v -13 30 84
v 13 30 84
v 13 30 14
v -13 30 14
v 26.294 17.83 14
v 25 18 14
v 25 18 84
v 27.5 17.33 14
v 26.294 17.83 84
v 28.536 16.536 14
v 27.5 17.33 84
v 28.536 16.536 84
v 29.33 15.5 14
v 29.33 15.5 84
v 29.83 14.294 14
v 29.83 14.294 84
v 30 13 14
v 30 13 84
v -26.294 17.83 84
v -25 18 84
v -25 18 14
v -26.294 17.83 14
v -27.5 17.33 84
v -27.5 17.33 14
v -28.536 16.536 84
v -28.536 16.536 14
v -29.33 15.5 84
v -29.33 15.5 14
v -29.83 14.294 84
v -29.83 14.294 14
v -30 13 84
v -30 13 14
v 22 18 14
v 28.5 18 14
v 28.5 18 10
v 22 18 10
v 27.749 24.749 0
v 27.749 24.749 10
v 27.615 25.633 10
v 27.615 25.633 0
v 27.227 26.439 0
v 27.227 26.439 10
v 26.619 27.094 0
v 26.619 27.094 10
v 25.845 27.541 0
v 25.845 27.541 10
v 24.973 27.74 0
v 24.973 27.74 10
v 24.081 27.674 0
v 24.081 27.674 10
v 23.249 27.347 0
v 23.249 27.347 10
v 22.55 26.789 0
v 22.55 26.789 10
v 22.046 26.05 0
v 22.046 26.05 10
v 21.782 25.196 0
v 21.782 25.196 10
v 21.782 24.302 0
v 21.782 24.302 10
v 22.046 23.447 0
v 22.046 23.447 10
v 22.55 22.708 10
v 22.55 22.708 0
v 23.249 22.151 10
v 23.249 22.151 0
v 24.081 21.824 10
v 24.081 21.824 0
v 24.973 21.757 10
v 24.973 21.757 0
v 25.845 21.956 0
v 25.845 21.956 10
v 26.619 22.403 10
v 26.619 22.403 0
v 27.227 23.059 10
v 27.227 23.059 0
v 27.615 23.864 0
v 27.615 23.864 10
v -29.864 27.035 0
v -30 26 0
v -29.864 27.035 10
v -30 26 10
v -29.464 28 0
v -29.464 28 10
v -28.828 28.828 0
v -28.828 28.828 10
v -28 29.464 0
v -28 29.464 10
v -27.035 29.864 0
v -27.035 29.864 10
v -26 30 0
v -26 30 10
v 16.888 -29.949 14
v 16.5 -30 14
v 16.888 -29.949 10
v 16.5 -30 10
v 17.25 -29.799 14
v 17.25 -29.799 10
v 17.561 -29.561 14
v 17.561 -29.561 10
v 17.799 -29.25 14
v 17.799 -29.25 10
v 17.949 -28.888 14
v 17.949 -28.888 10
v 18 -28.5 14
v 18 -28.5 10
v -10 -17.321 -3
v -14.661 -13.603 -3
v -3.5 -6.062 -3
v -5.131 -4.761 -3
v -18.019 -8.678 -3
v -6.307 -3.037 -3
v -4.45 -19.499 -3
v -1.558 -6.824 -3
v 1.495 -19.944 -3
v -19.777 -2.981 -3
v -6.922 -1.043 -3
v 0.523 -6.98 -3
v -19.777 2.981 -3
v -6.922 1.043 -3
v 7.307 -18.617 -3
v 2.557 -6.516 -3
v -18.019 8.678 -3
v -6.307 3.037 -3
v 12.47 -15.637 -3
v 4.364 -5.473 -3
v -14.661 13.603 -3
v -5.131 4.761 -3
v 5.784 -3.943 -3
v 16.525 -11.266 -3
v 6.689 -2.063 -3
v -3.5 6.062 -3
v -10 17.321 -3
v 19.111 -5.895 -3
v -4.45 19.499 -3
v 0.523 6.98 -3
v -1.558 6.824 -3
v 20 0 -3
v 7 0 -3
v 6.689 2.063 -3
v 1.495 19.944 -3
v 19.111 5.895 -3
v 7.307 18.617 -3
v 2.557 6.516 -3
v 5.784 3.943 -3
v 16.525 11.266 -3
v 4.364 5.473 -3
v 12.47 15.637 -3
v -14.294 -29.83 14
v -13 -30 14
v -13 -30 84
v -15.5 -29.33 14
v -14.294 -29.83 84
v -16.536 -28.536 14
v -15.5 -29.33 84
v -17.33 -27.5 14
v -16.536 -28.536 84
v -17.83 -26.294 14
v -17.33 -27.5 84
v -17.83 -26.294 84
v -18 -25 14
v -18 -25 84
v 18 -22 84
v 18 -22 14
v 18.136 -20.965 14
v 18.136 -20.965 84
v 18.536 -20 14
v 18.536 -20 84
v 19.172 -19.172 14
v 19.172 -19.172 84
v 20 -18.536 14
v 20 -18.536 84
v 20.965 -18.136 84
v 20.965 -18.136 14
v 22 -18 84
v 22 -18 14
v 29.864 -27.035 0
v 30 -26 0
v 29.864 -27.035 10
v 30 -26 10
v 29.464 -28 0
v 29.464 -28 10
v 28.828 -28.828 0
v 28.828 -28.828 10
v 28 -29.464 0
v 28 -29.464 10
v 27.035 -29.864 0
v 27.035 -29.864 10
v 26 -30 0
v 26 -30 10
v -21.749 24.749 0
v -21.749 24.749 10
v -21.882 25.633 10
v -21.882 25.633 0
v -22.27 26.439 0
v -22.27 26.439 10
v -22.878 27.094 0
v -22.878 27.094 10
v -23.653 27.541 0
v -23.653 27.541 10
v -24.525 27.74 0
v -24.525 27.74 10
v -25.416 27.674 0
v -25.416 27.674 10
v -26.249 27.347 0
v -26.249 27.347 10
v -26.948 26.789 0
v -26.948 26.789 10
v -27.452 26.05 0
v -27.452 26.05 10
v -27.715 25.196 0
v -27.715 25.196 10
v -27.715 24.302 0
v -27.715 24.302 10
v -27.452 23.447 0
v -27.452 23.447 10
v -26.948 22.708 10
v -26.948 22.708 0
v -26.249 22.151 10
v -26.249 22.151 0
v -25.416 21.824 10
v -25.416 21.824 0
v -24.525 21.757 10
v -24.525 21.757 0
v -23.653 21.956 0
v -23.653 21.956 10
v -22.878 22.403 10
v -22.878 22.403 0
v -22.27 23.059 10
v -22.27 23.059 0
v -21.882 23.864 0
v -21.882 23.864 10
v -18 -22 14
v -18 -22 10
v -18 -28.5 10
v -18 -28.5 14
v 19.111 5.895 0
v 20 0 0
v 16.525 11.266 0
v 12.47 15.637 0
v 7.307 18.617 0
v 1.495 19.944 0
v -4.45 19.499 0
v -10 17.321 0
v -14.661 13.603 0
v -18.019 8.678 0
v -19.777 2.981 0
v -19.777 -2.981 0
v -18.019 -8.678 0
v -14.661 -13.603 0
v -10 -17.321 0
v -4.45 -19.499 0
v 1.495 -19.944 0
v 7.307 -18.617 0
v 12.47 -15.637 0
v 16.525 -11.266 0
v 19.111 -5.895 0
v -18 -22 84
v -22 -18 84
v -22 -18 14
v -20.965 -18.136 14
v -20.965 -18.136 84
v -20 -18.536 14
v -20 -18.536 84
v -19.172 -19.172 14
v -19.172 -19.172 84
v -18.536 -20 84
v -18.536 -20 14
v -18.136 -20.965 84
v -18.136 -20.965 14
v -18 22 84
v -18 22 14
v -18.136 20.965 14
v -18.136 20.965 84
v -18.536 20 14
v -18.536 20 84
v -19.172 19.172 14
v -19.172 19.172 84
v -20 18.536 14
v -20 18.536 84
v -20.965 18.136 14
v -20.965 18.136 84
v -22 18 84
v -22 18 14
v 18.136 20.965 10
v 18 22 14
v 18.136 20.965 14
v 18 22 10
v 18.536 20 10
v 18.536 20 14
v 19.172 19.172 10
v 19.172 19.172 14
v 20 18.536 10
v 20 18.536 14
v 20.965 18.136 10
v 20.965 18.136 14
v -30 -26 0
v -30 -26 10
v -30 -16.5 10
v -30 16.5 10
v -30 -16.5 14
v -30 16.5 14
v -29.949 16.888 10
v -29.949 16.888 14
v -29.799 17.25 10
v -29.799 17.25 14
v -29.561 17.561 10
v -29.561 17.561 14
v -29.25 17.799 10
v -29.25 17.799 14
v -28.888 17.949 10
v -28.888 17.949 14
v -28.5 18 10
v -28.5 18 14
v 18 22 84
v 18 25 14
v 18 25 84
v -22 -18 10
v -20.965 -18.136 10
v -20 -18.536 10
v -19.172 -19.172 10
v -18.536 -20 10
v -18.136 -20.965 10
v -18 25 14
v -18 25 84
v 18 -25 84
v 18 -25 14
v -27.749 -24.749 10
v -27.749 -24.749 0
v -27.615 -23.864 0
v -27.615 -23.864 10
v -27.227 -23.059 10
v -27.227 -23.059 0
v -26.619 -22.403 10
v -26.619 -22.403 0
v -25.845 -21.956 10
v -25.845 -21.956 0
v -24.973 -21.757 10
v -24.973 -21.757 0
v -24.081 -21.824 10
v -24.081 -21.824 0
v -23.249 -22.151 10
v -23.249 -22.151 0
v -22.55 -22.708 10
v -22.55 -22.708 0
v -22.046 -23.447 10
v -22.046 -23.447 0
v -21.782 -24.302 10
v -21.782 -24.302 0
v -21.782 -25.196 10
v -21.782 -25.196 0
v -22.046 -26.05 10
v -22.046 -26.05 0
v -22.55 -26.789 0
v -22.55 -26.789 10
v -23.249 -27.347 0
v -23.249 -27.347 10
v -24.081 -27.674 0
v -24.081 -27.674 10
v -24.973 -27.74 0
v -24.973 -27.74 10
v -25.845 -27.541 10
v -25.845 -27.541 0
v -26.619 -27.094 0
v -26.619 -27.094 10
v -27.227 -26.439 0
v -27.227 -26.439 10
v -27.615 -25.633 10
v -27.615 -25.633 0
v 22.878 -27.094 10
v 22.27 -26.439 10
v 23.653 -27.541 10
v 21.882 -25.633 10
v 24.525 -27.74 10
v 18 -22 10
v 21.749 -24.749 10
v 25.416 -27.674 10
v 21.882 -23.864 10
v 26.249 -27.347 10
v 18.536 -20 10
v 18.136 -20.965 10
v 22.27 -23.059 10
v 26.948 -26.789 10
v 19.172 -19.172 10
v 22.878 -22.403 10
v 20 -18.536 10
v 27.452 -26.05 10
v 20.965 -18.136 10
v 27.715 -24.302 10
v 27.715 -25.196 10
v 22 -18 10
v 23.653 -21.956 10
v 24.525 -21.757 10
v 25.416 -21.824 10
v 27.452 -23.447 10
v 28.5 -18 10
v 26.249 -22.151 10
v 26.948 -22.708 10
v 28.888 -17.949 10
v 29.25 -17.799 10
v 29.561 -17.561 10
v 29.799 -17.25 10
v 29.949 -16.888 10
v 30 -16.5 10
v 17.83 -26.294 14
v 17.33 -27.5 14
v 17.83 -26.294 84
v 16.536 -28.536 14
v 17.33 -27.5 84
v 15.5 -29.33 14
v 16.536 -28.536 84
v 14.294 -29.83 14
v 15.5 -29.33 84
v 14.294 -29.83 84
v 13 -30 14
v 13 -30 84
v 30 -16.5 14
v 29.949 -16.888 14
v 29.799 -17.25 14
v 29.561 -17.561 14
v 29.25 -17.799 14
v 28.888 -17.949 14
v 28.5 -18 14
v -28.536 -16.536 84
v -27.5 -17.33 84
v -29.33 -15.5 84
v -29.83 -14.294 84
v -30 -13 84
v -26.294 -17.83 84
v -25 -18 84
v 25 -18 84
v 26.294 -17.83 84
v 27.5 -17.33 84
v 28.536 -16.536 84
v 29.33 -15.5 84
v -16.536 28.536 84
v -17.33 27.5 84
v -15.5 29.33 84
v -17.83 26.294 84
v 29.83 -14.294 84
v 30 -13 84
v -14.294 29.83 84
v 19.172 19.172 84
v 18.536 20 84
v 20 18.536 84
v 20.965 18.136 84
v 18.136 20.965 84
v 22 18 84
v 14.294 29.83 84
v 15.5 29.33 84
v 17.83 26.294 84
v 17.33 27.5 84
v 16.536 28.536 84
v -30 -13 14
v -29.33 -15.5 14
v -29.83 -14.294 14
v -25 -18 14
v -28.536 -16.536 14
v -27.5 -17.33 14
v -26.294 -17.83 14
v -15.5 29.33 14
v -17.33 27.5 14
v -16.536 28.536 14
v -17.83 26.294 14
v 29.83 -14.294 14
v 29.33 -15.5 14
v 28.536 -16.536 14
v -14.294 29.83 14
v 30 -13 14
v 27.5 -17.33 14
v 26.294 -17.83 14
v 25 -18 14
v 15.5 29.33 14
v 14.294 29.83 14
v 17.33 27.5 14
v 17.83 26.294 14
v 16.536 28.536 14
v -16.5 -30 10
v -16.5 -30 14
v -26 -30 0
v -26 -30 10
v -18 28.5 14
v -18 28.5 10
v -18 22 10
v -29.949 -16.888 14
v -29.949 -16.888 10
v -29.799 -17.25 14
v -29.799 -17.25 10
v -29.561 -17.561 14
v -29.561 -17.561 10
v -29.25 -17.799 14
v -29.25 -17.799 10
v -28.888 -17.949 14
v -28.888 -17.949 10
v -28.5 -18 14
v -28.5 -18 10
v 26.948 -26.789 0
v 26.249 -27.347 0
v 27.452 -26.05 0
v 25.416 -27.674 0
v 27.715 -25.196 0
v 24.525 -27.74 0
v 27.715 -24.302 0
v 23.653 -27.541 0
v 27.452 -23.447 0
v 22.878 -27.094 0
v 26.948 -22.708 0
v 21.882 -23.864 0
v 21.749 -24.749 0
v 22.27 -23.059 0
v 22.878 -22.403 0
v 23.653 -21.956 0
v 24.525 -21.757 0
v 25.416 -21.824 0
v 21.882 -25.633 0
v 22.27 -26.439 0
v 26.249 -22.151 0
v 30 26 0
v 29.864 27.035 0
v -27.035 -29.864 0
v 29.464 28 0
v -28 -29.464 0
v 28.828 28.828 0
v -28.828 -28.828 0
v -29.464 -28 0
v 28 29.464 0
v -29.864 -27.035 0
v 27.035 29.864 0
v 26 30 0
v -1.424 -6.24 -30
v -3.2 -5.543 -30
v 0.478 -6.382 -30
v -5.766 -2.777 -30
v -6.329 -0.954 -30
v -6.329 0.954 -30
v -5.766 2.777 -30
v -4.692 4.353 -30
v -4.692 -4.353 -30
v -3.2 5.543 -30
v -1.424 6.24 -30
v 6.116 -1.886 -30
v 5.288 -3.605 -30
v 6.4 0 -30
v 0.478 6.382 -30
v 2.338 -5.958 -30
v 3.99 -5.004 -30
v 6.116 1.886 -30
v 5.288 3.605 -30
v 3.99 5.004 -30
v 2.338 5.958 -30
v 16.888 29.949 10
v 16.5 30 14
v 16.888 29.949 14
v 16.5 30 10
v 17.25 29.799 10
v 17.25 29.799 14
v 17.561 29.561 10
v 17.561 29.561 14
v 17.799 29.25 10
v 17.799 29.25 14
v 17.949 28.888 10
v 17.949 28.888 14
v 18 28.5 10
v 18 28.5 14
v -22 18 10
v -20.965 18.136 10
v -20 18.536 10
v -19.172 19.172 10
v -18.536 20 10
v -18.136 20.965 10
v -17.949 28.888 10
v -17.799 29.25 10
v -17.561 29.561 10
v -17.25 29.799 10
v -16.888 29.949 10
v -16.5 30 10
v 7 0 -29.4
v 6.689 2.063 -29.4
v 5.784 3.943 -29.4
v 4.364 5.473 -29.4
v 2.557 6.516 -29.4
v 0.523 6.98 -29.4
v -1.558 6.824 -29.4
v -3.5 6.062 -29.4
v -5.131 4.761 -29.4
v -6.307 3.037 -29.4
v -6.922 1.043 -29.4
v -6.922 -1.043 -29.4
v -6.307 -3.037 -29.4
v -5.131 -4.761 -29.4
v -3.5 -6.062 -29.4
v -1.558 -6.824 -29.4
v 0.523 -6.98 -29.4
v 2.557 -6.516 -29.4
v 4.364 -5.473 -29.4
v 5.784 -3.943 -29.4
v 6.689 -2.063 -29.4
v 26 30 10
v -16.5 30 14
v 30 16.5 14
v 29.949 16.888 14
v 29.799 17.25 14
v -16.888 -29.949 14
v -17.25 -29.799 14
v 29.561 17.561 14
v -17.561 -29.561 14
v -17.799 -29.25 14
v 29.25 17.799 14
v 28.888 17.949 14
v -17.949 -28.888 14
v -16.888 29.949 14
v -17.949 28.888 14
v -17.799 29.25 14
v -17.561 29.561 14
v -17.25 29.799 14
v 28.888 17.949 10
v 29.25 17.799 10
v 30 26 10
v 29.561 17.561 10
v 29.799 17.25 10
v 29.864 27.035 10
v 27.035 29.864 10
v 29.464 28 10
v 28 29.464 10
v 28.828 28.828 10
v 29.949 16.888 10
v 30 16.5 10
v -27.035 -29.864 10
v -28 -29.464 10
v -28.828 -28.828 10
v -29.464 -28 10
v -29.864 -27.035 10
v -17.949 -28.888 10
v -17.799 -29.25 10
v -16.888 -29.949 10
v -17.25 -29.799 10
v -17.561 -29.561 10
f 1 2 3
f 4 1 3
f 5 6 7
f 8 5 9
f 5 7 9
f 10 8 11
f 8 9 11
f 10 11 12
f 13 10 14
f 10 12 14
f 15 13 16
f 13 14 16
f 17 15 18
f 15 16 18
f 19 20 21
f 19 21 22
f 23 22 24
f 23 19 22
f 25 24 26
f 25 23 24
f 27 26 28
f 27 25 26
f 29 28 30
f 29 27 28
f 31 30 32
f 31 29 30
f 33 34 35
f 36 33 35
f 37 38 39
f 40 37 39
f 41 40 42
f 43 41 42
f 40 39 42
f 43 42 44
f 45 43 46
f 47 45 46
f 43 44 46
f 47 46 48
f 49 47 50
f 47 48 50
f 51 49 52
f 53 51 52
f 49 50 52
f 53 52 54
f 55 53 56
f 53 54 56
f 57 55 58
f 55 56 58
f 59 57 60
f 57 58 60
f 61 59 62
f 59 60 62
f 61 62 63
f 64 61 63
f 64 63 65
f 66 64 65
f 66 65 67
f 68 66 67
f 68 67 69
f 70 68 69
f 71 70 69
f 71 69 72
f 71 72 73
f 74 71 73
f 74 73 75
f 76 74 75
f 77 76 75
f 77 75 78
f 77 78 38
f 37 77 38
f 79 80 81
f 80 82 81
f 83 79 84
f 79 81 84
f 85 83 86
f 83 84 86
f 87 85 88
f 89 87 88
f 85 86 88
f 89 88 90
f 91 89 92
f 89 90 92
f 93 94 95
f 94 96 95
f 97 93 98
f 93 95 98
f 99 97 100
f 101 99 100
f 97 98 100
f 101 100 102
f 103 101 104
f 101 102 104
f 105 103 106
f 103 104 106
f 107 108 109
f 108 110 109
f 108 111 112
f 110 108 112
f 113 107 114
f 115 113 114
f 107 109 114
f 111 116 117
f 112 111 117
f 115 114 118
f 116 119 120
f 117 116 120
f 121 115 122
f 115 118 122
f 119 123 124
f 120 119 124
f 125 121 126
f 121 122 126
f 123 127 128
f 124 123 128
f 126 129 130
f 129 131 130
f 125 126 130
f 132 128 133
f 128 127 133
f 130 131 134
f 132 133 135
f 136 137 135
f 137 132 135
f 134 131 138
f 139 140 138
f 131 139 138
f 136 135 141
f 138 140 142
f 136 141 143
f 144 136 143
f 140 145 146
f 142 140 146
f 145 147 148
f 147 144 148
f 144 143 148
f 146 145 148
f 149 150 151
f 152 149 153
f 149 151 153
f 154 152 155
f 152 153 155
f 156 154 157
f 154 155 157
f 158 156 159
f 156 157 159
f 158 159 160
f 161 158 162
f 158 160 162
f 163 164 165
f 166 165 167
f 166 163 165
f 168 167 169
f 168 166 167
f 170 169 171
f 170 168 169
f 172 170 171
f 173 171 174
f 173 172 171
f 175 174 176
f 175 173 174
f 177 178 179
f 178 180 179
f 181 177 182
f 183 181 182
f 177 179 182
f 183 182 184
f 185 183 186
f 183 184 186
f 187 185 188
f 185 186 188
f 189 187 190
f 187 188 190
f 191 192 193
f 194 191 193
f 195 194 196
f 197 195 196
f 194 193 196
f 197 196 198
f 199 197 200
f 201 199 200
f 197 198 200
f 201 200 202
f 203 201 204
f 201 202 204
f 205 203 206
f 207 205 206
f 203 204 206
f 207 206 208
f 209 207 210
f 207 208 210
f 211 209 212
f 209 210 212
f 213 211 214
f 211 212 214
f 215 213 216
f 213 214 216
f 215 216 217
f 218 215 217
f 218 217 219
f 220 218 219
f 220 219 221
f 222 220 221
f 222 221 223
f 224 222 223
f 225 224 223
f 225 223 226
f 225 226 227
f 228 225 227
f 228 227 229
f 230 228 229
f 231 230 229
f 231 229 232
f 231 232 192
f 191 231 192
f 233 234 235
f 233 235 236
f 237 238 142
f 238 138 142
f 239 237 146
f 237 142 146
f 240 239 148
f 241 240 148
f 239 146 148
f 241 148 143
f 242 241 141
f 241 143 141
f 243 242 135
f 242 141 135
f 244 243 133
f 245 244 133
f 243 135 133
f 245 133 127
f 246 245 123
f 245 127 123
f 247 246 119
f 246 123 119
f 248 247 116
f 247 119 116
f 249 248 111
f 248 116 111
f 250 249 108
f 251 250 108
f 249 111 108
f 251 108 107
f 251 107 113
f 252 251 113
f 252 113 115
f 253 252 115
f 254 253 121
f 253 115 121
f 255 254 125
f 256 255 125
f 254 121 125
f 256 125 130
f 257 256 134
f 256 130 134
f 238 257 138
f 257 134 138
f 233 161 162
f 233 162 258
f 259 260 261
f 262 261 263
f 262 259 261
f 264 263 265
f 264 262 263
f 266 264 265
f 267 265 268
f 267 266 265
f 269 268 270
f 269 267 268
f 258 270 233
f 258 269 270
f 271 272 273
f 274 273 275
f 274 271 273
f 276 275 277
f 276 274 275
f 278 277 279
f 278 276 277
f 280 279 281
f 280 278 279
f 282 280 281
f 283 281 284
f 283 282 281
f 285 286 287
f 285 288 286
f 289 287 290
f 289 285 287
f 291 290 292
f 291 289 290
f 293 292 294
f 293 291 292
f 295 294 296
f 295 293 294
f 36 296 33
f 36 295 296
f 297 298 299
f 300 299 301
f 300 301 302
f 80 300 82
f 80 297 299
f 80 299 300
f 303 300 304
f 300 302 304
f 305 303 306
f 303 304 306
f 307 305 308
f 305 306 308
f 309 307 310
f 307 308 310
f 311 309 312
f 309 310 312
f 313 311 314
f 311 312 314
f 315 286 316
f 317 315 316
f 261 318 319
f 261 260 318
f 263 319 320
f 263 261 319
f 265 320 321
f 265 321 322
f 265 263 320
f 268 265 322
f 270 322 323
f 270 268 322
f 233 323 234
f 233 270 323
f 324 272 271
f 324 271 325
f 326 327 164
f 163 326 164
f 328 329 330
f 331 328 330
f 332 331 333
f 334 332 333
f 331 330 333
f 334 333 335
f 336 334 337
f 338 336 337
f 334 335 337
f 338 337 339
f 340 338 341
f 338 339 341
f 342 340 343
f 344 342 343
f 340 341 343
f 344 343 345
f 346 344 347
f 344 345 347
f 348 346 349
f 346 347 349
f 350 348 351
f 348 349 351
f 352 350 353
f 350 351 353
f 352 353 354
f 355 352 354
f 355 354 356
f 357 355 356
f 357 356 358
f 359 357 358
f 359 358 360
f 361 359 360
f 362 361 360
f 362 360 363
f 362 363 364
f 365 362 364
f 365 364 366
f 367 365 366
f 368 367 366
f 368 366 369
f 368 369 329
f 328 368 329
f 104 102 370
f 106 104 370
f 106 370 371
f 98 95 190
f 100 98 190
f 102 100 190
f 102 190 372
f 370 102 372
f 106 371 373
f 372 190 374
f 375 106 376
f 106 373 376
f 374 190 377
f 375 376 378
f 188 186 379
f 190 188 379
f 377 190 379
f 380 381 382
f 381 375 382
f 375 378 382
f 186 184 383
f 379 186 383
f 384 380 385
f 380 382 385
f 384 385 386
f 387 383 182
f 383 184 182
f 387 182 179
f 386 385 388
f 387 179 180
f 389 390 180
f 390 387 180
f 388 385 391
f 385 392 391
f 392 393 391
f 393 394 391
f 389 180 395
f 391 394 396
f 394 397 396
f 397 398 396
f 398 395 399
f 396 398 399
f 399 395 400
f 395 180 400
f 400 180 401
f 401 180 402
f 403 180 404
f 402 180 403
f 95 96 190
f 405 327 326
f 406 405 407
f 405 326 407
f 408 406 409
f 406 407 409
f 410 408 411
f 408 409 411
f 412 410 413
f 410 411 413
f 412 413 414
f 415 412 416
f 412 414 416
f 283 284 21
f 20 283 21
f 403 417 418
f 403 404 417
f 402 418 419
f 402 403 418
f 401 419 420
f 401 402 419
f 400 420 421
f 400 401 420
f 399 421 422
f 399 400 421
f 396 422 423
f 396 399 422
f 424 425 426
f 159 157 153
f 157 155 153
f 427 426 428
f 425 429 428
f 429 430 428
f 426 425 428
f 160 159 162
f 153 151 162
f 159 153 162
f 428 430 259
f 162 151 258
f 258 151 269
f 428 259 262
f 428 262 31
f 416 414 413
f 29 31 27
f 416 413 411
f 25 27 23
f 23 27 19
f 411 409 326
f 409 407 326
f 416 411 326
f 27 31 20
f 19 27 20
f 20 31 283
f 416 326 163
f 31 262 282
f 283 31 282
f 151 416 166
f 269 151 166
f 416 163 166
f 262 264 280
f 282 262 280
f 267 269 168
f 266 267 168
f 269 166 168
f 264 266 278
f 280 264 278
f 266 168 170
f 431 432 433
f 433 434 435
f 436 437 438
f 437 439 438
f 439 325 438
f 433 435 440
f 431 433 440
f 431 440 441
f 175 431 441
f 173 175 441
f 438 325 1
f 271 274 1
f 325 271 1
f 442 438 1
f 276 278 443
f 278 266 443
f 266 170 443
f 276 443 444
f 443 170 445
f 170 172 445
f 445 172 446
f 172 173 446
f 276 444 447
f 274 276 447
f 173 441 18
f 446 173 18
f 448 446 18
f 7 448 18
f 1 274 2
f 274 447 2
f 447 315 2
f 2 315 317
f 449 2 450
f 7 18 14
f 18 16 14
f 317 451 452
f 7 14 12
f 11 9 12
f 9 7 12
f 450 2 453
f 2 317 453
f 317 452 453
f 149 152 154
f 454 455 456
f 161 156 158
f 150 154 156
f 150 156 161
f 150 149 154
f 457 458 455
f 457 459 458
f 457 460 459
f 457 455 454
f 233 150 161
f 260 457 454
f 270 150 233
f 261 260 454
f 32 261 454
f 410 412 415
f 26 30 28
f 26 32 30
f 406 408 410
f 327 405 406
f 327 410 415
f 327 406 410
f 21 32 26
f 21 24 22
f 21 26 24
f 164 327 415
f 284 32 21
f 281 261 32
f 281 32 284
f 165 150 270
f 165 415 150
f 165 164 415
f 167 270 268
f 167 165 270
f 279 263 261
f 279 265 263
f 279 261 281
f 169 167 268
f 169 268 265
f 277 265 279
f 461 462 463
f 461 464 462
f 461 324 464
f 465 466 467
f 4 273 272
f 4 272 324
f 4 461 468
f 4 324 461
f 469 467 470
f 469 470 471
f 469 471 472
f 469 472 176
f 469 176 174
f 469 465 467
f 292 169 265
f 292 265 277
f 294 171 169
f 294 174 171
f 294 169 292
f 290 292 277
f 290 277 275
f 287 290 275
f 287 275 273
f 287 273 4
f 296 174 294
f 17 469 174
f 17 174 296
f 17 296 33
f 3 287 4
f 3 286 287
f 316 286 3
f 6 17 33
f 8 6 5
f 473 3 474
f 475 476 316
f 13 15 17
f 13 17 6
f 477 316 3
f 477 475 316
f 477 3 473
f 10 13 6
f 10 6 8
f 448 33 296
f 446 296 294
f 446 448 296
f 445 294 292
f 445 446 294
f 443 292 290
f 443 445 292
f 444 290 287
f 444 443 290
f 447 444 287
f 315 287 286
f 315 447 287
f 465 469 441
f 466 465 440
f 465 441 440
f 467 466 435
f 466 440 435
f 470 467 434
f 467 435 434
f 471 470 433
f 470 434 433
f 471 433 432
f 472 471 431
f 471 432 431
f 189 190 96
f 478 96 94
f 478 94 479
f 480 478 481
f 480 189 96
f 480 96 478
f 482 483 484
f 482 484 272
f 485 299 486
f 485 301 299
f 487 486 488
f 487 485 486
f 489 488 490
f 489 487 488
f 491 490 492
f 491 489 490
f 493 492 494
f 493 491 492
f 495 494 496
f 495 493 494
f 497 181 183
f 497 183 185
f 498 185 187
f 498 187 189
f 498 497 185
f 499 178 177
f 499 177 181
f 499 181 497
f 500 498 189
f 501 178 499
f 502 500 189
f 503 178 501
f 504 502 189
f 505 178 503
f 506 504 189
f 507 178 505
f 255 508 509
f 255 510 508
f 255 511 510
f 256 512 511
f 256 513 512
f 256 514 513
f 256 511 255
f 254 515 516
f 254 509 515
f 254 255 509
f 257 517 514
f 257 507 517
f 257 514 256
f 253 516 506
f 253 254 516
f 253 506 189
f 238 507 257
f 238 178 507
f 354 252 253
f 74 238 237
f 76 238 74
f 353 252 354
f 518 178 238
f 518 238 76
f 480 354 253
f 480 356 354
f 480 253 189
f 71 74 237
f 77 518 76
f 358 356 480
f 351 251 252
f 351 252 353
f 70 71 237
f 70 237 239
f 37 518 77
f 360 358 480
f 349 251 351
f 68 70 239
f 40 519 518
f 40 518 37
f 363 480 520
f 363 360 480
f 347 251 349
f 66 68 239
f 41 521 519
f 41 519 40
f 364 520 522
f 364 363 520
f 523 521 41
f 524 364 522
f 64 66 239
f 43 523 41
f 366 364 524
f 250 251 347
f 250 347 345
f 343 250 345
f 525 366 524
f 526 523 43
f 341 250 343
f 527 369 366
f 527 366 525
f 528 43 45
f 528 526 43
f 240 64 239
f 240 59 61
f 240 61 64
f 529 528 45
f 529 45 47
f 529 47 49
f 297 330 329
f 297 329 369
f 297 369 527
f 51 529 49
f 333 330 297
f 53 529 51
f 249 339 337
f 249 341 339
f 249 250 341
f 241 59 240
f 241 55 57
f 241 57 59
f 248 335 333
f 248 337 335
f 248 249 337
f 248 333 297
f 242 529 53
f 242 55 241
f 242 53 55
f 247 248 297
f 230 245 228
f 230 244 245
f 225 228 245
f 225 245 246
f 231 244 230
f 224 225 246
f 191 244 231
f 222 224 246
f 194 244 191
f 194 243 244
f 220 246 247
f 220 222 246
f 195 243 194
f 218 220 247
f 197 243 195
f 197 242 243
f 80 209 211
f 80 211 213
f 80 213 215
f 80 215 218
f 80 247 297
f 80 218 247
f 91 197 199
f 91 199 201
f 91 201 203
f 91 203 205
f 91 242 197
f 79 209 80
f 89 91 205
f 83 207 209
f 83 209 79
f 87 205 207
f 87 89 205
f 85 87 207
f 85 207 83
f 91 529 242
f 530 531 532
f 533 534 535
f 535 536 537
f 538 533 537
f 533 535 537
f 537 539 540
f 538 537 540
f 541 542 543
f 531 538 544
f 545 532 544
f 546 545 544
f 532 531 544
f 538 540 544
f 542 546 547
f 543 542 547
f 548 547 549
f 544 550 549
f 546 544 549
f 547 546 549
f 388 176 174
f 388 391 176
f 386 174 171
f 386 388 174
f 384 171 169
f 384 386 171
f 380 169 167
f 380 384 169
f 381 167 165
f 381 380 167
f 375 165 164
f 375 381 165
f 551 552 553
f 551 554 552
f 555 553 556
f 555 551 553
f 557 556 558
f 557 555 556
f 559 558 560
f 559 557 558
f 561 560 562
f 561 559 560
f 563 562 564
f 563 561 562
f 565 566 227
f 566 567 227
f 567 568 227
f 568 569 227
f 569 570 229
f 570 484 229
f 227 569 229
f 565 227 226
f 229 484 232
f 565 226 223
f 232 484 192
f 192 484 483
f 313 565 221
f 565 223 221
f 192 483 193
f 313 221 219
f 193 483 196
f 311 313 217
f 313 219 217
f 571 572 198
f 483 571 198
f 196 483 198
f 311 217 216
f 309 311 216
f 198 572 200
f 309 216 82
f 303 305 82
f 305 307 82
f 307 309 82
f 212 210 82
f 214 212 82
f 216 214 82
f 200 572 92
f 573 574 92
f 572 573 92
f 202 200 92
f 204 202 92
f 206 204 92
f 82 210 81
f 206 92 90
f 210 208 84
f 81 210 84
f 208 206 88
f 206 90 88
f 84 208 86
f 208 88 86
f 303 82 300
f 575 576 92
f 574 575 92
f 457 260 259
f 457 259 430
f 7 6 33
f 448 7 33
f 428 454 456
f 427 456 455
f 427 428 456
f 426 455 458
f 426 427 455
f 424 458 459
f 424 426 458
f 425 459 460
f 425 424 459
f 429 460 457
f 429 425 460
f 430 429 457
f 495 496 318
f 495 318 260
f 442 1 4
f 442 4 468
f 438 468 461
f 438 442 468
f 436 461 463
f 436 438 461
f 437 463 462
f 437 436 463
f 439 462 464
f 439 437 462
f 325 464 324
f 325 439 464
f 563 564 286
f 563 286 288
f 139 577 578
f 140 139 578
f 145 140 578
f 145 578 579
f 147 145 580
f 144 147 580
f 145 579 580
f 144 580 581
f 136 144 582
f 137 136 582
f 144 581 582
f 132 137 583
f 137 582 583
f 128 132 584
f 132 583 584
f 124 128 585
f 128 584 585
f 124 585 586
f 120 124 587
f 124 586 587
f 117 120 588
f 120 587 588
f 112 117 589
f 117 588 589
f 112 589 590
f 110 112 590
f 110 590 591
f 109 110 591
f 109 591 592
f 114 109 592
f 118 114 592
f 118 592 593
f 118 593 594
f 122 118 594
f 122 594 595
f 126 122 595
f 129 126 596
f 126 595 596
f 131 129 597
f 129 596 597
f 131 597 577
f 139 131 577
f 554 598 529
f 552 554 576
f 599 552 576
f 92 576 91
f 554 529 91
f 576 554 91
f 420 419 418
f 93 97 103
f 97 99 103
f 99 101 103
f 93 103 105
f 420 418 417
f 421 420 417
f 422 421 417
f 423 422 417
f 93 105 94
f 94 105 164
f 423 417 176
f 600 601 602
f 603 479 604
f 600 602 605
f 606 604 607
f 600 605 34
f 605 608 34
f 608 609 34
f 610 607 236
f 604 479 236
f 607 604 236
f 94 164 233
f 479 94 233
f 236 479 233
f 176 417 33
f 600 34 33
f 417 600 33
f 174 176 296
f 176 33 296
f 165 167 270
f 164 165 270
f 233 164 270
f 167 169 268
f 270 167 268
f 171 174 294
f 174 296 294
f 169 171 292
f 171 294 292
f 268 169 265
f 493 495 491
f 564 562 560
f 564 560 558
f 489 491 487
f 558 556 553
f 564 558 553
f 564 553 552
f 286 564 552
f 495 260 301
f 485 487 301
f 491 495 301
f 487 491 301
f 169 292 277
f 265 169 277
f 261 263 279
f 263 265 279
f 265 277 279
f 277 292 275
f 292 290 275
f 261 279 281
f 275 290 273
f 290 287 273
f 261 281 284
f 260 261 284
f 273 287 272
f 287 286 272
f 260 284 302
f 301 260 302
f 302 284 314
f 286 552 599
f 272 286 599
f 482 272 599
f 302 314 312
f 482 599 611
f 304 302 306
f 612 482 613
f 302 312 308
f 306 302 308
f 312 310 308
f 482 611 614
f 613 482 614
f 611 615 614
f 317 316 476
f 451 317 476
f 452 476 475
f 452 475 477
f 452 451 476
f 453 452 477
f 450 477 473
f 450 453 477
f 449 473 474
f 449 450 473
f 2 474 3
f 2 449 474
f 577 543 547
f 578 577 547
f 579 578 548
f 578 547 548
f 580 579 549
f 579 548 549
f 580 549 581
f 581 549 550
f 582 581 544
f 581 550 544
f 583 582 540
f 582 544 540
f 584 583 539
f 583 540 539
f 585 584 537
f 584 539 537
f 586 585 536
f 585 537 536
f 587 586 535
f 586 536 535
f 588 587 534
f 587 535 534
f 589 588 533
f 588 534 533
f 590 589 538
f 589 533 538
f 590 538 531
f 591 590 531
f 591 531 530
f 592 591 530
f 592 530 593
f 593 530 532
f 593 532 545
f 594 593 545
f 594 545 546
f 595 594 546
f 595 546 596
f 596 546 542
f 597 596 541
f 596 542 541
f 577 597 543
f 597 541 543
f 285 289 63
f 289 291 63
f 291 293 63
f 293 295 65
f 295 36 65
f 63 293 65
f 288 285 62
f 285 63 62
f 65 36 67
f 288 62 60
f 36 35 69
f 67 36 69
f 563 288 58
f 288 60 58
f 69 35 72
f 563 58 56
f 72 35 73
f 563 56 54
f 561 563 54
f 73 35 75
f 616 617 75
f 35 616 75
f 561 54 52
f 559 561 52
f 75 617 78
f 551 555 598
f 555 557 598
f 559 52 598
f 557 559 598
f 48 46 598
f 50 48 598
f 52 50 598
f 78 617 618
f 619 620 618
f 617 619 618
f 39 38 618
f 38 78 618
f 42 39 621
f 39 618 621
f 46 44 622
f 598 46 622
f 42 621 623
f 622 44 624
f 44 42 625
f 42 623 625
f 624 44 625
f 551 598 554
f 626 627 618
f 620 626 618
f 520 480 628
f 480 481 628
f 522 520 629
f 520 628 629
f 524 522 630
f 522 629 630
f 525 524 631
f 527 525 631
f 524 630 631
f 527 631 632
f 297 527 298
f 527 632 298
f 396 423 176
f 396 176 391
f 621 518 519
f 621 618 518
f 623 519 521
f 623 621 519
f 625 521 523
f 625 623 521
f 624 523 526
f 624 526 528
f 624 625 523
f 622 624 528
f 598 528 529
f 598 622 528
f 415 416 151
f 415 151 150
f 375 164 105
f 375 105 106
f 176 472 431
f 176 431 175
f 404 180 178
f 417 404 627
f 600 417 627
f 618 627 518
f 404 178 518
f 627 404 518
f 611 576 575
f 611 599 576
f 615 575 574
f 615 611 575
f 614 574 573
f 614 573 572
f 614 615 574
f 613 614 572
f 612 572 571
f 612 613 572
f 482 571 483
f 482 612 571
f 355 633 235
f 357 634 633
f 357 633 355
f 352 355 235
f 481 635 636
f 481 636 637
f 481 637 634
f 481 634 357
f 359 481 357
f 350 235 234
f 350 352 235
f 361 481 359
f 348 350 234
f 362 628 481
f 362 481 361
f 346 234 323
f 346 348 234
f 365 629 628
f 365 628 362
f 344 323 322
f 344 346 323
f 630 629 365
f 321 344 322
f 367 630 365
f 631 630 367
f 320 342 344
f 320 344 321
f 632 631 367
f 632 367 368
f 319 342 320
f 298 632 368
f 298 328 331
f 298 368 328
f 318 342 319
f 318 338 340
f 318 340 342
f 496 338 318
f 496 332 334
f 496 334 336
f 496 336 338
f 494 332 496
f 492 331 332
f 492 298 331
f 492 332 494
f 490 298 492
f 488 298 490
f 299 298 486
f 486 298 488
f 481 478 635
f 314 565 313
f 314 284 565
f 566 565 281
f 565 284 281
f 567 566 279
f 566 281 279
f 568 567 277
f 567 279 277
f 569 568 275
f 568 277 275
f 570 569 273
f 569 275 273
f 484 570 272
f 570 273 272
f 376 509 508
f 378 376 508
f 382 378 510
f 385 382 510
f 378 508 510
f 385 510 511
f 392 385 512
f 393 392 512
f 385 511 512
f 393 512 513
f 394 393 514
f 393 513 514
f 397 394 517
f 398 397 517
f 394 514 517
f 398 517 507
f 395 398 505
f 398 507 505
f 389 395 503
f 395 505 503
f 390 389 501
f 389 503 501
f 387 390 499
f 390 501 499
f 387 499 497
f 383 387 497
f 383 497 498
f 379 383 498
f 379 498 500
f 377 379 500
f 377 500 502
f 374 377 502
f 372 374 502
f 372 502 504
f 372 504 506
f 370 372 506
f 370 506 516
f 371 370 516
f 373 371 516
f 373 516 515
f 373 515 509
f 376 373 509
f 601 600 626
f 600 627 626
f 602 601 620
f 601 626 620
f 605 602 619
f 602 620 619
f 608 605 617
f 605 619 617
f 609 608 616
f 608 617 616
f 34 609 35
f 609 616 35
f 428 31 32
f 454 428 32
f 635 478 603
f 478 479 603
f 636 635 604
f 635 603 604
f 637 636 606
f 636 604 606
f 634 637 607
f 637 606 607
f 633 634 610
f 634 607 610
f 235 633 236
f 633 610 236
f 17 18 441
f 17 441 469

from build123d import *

# Parameters (mm, degrees)
SKETCH_1_W                = 60
SKETCH_1_H                = 60
EXTRUDE_1_DEPTH           = 14
SKETCH_2_W                = 4
SKETCH_2_H                = 12
CUT_EXTRUDE_1_DEPTH       = 12
SKETCH_3_W                = 12
SKETCH_3_H                = 4
CUT_EXTRUDE_2_DEPTH       = 12
SKETCH_4_W                = 4
SKETCH_4_H                = 12
CUT_EXTRUDE_3_DEPTH       = 12
SKETCH_5_W                = 4
SKETCH_5_H                = 12
CUT_EXTRUDE_4_DEPTH       = 12
HOLE_WIZARD_6_0_6_1_D     = 6
HOLE_WIZARD_6_0_6_1_DEPTH = 40
HOLE_WIZARD_6_0_6_2_D     = 6
HOLE_WIZARD_6_0_6_2_DEPTH = 14
CHAMFER_1_SIZE            = 0.6
FILLET_1_R                = 1.5
FILLET_2_R                = 4
SKETCH_15_W               = 75
SKETCH_15_H               = 60
EXTRUDE_2_DEPTH           = 60
SKETCH_21_W               = 12
SKETCH_21_H               = 12
CUT_EXTRUDE_5_DEPTH       = 87.168439698
SKETCH_43_W               = 12
SKETCH_43_H               = 12
CUT_EXTRUDE_7_DEPTH       = 87.168439698
SKETCH_50_W               = 12
SKETCH_50_H               = 12
CUT_EXTRUDE_8_DEPTH       = 87.168439698
SKETCH_57_W               = 12
SKETCH_57_H               = 12
CUT_EXTRUDE_9_DEPTH       = 87.168439698
FILLET_5_R                = 4
FILLET_6_R                = 5
SKETCH_58_W               = 5
SKETCH_58_H               = 60
CUT_EXTRUDE_10_DEPTH      = 86


with BuildPart() as part:
    # 草图1 → 凸台-拉伸1 (new body)
    with BuildSketch(Plane(origin=(0, 0, 0), x_dir=(-1, 0, 0), z_dir=(0, 0, -1))):
        Rectangle(SKETCH_1_W, SKETCH_1_H)
    extrude(amount=-EXTRUDE_1_DEPTH)

    # 草图2 → 切除-拉伸1 (cut)
    with BuildSketch(Plane(origin=(30, 0, 0), x_dir=(0, 0, -1), z_dir=(1, 0, 0))):
        with Locations((-12, 24)):
            Rectangle(SKETCH_2_W, SKETCH_2_H)
    extrude(amount=-CUT_EXTRUDE_1_DEPTH, mode=Mode.SUBTRACT)

    # 草图3 → 切除-拉伸2 (cut)
    with BuildSketch(Plane(origin=(0, 30, 0), x_dir=(-1, 0, 0), z_dir=(0, 1, 0))):
        with Locations((24, 12)):
            Rectangle(SKETCH_3_W, SKETCH_3_H)
    extrude(amount=-CUT_EXTRUDE_2_DEPTH, mode=Mode.SUBTRACT)

    # 草图4 → 切除-拉伸3 (cut)
    with BuildSketch(Plane.ZY.offset(30)):
        with Locations((12, -24)):
            Rectangle(SKETCH_4_W, SKETCH_4_H)
    extrude(amount=-CUT_EXTRUDE_3_DEPTH, mode=Mode.SUBTRACT)

    # 草图5 → 切除-拉伸4 (cut)
    with BuildSketch(Plane(origin=(30, 0, 0), x_dir=(0, 0, -1), z_dir=(1, 0, 0))):
        with Locations((-12, -24)):
            Rectangle(SKETCH_5_W, SKETCH_5_H)
    extrude(amount=-CUT_EXTRUDE_4_DEPTH, mode=Mode.SUBTRACT)

    # 草图6 → 旋转1 (revolve)
    with BuildSketch(Plane(origin=(0, 0, 0), x_dir=(1, 0, 0), z_dir=(0, 1, 0))):
        Polygon((7, 30), (0, 30), (0, 0), (20, 0), (20, 3), (7, 3), align=None)
    revolve(axis=Axis((0, 0, -30), (0, 0, 1)))

    # Ø6.0 (6) 直径孔1
    with Locations(Plane.XY.offset(10)):
        with Locations((-24.748737342, -24.748737342), (24.748737342, -24.748737342)):
            Hole(HOLE_WIZARD_6_0_6_1_D / 2, depth=HOLE_WIZARD_6_0_6_1_DEPTH)

    # Ø6.0 (6) 直径孔2
    with Locations(Plane(origin=(0, 0, 0), x_dir=(-1, 0, 0), z_dir=(0, 0, -1))):
        with Locations((24.748737342, 24.748737342), (-24.748737342, 24.748737342)):
            Hole(HOLE_WIZARD_6_0_6_2_D / 2, depth=HOLE_WIZARD_6_0_6_2_DEPTH)

    # 倒角1
    chamfer_1_edges = [part.edges().sort_by_distance(p)[0] for p in [
        (-7, 0, -30),
    ]]
    chamfer(chamfer_1_edges, length=CHAMFER_1_SIZE)

    # 圆角1
    fillet_1_edges = [part.edges().sort_by_distance(p)[0] for p in [
        (18, 30, 12),
        (30, 18, 12),
        (-30, 18, 12),
        (-18, 30, 12),
        (-18, -30, 12),
        (-30, -18, 12),
        (18, -30, 12),
        (30, -18, 12),
    ]]
    fillet(fillet_1_edges, radius=FILLET_1_R)

    # 圆角2
    fillet_2_edges = [part.edges().sort_by_distance(p)[0] for p in [
        (30, 30, 5),
        (18, 18, 12),
        (-30, 30, 5),
        (-18, 18, 12),
        (-30, -30, 5),
        (-18, -18, 12),
        (30, -30, 5),
        (18, -18, 12),
    ]]
    fillet(fillet_2_edges, radius=FILLET_2_R)


with BuildPart() as body_2:
    # 草图15 → 凸台-拉伸2 (new body)
    with BuildSketch(Plane(origin=(30, 0, 0), x_dir=(0, 0, -1), z_dir=(1, 0, 0))):
        with Locations((-51.5, 0)):
            Rectangle(SKETCH_15_W, SKETCH_15_H)
    extrude(amount=-EXTRUDE_2_DEPTH)

    # 草图21 → 切除-拉伸5 (cut, through all)
    with BuildSketch(Plane(origin=(0, 0, 14), x_dir=(-1, 0, 0), z_dir=(0, 0, -1))):
        with Locations((24, -24)):
            Rectangle(SKETCH_21_W, SKETCH_21_H)
    extrude(amount=-CUT_EXTRUDE_5_DEPTH, mode=Mode.SUBTRACT)

    # 草图43 → 切除-拉伸7 (cut, through all)
    with BuildSketch(Plane(origin=(0, 0, 14), x_dir=(-1, 0, 0), z_dir=(0, 0, -1))):
        with Locations((-24, -24)):
            Rectangle(SKETCH_43_W, SKETCH_43_H)
    extrude(amount=-CUT_EXTRUDE_7_DEPTH, mode=Mode.SUBTRACT)

    # 草图50 → 切除-拉伸8 (cut, through all)
    with BuildSketch(Plane(origin=(0, 0, 14), x_dir=(-1, 0, 0), z_dir=(0, 0, -1))):
        with Locations((-24, 24)):
            Rectangle(SKETCH_50_W, SKETCH_50_H)
    extrude(amount=-CUT_EXTRUDE_8_DEPTH, mode=Mode.SUBTRACT)

    # 草图57 → 切除-拉伸9 (cut, through all)
    with BuildSketch(Plane(origin=(0, 0, 14), x_dir=(-1, 0, 0), z_dir=(0, 0, -1))):
        with Locations((24, 24)):
            Rectangle(SKETCH_57_W, SKETCH_57_H)
    extrude(amount=-CUT_EXTRUDE_9_DEPTH, mode=Mode.SUBTRACT)

    # 圆角5
    fillet_5_edges = [body_2.edges().sort_by_distance(p)[0] for p in [
        (-18, -18, 51.5),
        (18, -18, 51.5),
        (18, 18, 51.5),
        (-18, 18, 51.5),
    ]]
    fillet(fillet_5_edges, radius=FILLET_5_R)

    # 圆角6
    fillet_6_edges = [body_2.edges().sort_by_distance(p)[0] for p in [
        (-30, -18, 51.5),
        (-18, -30, 51.5),
        (18, -30, 51.5),
        (30, -18, 51.5),
        (30, 18, 51.5),
        (18, 30, 51.5),
        (-18, 30, 51.5),
        (-30, 18, 51.5),
    ]]
    fillet(fillet_6_edges, radius=FILLET_6_R)

    # 草图58 → 切除-拉伸10 (cut)
    with BuildSketch(Plane(origin=(30, 0, 0), x_dir=(0, 0, -1), z_dir=(1, 0, 0))):
        with Locations((-86.5, 0)):
            Rectangle(SKETCH_58_W, SKETCH_58_H)
    extrude(amount=-CUT_EXTRUDE_10_DEPTH, mode=Mode.SUBTRACT)


solid = Compound([part.part, body_2.part])
